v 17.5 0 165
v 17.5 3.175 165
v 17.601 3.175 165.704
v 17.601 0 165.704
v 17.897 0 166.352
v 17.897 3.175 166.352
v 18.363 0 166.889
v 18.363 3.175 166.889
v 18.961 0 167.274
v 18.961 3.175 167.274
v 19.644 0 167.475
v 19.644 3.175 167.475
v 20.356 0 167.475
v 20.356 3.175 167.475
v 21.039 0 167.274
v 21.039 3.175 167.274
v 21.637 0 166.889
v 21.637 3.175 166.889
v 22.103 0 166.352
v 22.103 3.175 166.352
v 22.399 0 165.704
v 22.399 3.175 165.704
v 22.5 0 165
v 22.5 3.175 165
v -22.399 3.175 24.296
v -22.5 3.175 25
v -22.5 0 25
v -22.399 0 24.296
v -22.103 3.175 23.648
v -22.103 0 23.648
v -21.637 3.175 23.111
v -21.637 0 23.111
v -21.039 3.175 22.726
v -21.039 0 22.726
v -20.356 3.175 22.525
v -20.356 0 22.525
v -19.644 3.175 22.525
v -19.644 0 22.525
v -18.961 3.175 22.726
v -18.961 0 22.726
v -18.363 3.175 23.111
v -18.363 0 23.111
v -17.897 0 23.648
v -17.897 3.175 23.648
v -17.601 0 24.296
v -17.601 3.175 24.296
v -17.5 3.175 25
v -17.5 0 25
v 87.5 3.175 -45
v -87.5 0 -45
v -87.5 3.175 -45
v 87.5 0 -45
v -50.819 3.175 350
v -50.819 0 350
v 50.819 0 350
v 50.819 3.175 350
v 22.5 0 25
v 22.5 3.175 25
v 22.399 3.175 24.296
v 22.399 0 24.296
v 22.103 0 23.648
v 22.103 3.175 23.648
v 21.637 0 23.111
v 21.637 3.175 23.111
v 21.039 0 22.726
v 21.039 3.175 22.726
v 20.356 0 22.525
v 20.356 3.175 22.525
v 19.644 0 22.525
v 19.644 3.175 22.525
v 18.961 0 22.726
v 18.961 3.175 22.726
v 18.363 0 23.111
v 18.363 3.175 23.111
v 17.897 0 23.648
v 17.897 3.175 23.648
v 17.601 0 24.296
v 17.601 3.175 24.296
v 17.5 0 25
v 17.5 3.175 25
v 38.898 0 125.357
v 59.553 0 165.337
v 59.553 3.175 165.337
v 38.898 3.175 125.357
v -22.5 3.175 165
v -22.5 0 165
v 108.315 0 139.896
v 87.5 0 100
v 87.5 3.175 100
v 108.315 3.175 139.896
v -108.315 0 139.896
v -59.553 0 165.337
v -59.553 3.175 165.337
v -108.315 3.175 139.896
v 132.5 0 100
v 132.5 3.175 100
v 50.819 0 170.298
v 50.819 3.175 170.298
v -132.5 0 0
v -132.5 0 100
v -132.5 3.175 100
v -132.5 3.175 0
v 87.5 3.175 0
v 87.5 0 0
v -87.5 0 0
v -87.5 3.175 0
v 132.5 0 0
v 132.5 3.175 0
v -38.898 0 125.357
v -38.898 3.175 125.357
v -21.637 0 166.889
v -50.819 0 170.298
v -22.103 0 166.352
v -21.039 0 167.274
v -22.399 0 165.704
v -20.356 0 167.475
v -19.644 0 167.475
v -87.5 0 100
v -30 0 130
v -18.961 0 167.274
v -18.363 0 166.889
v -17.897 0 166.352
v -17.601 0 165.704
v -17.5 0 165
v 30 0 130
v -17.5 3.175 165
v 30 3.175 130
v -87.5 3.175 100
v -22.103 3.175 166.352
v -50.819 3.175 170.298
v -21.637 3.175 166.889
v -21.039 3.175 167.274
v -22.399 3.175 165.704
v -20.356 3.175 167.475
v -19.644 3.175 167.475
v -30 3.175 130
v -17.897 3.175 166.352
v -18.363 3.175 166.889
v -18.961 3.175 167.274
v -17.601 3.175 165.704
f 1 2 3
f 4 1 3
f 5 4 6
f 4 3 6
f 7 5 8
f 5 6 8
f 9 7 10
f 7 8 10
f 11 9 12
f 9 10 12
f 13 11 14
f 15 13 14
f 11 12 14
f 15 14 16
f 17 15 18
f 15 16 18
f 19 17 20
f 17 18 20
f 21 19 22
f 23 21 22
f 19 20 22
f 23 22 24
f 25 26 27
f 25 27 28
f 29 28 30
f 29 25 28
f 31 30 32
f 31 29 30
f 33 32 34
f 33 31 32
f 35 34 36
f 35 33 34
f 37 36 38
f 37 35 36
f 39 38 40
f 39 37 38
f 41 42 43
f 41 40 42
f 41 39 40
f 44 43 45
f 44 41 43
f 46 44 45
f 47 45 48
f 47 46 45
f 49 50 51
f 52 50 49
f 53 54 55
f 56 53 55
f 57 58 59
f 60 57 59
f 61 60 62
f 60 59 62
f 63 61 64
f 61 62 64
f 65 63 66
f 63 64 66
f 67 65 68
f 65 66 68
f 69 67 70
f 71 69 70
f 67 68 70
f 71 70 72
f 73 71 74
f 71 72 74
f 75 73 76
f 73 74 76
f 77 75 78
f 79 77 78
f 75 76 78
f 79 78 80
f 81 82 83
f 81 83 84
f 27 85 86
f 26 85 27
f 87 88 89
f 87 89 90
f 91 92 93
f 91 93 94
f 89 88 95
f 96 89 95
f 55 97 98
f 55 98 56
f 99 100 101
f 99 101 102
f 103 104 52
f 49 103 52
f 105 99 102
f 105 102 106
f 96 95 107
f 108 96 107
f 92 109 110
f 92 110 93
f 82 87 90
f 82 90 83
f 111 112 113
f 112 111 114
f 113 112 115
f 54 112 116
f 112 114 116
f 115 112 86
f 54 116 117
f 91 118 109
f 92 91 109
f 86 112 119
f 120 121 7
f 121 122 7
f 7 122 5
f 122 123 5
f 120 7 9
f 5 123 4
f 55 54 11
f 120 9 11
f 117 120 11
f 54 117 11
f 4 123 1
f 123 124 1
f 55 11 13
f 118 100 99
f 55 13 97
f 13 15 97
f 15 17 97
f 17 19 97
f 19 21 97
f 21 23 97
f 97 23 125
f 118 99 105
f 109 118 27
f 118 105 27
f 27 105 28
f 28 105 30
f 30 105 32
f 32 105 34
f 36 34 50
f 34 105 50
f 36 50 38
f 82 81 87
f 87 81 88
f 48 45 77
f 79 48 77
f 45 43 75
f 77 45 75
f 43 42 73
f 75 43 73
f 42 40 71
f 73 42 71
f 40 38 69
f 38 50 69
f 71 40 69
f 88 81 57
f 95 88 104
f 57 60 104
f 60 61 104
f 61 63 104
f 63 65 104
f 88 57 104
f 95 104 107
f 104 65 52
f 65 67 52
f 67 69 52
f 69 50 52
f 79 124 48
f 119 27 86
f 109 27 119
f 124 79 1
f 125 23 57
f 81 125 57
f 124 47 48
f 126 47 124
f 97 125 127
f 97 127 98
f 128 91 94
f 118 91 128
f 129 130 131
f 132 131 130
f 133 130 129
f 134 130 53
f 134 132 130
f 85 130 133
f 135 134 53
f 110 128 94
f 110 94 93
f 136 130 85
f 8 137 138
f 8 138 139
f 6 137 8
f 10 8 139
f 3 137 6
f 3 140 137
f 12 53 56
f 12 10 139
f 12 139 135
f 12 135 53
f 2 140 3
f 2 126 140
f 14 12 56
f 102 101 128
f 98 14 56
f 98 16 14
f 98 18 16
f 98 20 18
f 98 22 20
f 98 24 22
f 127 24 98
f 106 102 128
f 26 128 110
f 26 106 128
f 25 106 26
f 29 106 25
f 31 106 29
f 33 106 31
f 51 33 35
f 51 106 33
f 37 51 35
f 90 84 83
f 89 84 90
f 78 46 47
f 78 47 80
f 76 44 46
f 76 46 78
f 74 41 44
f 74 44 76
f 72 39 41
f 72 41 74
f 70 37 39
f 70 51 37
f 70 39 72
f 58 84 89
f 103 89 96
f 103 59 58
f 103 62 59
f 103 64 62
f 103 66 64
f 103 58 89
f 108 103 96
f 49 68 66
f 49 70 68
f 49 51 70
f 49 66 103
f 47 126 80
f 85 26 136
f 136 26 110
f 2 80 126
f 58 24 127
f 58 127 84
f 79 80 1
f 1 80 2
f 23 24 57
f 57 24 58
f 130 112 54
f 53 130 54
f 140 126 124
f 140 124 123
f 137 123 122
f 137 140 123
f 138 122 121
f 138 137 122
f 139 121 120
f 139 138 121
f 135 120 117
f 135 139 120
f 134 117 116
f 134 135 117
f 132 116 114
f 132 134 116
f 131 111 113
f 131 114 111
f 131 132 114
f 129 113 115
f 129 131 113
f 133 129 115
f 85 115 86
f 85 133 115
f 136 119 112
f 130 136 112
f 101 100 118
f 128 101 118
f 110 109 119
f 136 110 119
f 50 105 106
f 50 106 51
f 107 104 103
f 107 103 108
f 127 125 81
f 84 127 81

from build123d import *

# Parameters (mm, degrees)
BASE_DEPTH          = 3.175
SKETCH2_W           = 175
SKETCH2_H           = 45
BOSS_EXTRUDE2_DEPTH = 3.175
SKETCH3_W           = 45
SKETCH3_H           = 100
BOSS_EXTRUDE3_DEPTH = 3.175
CUT_EXTRUDE1_DEPTH  = 375.254366207


with BuildPart() as part:
    # Sketch1 → Base (new body)
    with BuildSketch(Plane(origin=(0, 0, 0), x_dir=(1, 0, 0), z_dir=(0, 1, 0))):
        Polygon((87.5, 0), (-87.5, 0), (-87.5, -100), (-30, -130), (-30, -350), (30, -350), (30, -130), (87.5, -100), align=None)
    extrude(amount=BASE_DEPTH)

    # Sketch2 → Boss-Extrude2 (add)
    with BuildSketch(Plane(origin=(0, 0, 0), x_dir=(1, 0, 0), z_dir=(0, 1, 0))):
        with Locations((0, 22.5)):
            Rectangle(SKETCH2_W, SKETCH2_H)
        Polygon((-108.315470301, -139.896318077), (-87.5, -100), (-38.733948559, -125.03895229), (-59.553303762, -165.337448446), align=None)
        Polygon((108.315470301, -139.896318077), (59.553303762, -165.337448446), (38.733948559, -125.03895229), (87.5, -100), align=None)
        Polygon((-30, -130), (-50.819355203, -170.298496155), (-50.819355203, -350), (-30, -350), align=None)
        Polygon((50.819355203, -170.298496155), (50.819355203, -350), (30, -350), (30, -130), align=None)
    extrude(amount=BOSS_EXTRUDE2_DEPTH)

    # Sketch3 → Boss-Extrude3 (add)
    with BuildSketch(Plane(origin=(0, 0, 0), x_dir=(1, 0, 0), z_dir=(0, 1, 0))):
        with Locations((-110, -50)):
            Rectangle(SKETCH3_W, SKETCH3_H)
        with Locations((110, -50)):
            Rectangle(SKETCH3_W, SKETCH3_H)
    extrude(amount=BOSS_EXTRUDE3_DEPTH)

    # Sketch4 → Cut-Extrude1 (cut, through all)
    with BuildSketch(Plane(origin=(0, 3.175, 0), x_dir=(1, 0, 0), z_dir=(0, 1, 0))):
        with BuildLine():
            Line((-17.5, -25), (-17.5, -165))
            ThreePointArc((-17.5, -165), (-20, -167.5), (-22.5, -165))
            Line((-22.5, -165), (-22.5, -25))
            ThreePointArc((-22.5, -25), (-20, -22.5), (-17.5, -25))
        make_face()
        with BuildLine():
            Line((17.5, -25), (17.5, -165))
            ThreePointArc((17.5, -165), (20, -167.5), (22.5, -165))
            Line((22.5, -165), (22.5, -25))
            ThreePointArc((22.5, -25), (20, -22.5), (17.5, -25))
        make_face()
    extrude(amount=-CUT_EXTRUDE1_DEPTH, mode=Mode.SUBTRACT)


solid = part.part
